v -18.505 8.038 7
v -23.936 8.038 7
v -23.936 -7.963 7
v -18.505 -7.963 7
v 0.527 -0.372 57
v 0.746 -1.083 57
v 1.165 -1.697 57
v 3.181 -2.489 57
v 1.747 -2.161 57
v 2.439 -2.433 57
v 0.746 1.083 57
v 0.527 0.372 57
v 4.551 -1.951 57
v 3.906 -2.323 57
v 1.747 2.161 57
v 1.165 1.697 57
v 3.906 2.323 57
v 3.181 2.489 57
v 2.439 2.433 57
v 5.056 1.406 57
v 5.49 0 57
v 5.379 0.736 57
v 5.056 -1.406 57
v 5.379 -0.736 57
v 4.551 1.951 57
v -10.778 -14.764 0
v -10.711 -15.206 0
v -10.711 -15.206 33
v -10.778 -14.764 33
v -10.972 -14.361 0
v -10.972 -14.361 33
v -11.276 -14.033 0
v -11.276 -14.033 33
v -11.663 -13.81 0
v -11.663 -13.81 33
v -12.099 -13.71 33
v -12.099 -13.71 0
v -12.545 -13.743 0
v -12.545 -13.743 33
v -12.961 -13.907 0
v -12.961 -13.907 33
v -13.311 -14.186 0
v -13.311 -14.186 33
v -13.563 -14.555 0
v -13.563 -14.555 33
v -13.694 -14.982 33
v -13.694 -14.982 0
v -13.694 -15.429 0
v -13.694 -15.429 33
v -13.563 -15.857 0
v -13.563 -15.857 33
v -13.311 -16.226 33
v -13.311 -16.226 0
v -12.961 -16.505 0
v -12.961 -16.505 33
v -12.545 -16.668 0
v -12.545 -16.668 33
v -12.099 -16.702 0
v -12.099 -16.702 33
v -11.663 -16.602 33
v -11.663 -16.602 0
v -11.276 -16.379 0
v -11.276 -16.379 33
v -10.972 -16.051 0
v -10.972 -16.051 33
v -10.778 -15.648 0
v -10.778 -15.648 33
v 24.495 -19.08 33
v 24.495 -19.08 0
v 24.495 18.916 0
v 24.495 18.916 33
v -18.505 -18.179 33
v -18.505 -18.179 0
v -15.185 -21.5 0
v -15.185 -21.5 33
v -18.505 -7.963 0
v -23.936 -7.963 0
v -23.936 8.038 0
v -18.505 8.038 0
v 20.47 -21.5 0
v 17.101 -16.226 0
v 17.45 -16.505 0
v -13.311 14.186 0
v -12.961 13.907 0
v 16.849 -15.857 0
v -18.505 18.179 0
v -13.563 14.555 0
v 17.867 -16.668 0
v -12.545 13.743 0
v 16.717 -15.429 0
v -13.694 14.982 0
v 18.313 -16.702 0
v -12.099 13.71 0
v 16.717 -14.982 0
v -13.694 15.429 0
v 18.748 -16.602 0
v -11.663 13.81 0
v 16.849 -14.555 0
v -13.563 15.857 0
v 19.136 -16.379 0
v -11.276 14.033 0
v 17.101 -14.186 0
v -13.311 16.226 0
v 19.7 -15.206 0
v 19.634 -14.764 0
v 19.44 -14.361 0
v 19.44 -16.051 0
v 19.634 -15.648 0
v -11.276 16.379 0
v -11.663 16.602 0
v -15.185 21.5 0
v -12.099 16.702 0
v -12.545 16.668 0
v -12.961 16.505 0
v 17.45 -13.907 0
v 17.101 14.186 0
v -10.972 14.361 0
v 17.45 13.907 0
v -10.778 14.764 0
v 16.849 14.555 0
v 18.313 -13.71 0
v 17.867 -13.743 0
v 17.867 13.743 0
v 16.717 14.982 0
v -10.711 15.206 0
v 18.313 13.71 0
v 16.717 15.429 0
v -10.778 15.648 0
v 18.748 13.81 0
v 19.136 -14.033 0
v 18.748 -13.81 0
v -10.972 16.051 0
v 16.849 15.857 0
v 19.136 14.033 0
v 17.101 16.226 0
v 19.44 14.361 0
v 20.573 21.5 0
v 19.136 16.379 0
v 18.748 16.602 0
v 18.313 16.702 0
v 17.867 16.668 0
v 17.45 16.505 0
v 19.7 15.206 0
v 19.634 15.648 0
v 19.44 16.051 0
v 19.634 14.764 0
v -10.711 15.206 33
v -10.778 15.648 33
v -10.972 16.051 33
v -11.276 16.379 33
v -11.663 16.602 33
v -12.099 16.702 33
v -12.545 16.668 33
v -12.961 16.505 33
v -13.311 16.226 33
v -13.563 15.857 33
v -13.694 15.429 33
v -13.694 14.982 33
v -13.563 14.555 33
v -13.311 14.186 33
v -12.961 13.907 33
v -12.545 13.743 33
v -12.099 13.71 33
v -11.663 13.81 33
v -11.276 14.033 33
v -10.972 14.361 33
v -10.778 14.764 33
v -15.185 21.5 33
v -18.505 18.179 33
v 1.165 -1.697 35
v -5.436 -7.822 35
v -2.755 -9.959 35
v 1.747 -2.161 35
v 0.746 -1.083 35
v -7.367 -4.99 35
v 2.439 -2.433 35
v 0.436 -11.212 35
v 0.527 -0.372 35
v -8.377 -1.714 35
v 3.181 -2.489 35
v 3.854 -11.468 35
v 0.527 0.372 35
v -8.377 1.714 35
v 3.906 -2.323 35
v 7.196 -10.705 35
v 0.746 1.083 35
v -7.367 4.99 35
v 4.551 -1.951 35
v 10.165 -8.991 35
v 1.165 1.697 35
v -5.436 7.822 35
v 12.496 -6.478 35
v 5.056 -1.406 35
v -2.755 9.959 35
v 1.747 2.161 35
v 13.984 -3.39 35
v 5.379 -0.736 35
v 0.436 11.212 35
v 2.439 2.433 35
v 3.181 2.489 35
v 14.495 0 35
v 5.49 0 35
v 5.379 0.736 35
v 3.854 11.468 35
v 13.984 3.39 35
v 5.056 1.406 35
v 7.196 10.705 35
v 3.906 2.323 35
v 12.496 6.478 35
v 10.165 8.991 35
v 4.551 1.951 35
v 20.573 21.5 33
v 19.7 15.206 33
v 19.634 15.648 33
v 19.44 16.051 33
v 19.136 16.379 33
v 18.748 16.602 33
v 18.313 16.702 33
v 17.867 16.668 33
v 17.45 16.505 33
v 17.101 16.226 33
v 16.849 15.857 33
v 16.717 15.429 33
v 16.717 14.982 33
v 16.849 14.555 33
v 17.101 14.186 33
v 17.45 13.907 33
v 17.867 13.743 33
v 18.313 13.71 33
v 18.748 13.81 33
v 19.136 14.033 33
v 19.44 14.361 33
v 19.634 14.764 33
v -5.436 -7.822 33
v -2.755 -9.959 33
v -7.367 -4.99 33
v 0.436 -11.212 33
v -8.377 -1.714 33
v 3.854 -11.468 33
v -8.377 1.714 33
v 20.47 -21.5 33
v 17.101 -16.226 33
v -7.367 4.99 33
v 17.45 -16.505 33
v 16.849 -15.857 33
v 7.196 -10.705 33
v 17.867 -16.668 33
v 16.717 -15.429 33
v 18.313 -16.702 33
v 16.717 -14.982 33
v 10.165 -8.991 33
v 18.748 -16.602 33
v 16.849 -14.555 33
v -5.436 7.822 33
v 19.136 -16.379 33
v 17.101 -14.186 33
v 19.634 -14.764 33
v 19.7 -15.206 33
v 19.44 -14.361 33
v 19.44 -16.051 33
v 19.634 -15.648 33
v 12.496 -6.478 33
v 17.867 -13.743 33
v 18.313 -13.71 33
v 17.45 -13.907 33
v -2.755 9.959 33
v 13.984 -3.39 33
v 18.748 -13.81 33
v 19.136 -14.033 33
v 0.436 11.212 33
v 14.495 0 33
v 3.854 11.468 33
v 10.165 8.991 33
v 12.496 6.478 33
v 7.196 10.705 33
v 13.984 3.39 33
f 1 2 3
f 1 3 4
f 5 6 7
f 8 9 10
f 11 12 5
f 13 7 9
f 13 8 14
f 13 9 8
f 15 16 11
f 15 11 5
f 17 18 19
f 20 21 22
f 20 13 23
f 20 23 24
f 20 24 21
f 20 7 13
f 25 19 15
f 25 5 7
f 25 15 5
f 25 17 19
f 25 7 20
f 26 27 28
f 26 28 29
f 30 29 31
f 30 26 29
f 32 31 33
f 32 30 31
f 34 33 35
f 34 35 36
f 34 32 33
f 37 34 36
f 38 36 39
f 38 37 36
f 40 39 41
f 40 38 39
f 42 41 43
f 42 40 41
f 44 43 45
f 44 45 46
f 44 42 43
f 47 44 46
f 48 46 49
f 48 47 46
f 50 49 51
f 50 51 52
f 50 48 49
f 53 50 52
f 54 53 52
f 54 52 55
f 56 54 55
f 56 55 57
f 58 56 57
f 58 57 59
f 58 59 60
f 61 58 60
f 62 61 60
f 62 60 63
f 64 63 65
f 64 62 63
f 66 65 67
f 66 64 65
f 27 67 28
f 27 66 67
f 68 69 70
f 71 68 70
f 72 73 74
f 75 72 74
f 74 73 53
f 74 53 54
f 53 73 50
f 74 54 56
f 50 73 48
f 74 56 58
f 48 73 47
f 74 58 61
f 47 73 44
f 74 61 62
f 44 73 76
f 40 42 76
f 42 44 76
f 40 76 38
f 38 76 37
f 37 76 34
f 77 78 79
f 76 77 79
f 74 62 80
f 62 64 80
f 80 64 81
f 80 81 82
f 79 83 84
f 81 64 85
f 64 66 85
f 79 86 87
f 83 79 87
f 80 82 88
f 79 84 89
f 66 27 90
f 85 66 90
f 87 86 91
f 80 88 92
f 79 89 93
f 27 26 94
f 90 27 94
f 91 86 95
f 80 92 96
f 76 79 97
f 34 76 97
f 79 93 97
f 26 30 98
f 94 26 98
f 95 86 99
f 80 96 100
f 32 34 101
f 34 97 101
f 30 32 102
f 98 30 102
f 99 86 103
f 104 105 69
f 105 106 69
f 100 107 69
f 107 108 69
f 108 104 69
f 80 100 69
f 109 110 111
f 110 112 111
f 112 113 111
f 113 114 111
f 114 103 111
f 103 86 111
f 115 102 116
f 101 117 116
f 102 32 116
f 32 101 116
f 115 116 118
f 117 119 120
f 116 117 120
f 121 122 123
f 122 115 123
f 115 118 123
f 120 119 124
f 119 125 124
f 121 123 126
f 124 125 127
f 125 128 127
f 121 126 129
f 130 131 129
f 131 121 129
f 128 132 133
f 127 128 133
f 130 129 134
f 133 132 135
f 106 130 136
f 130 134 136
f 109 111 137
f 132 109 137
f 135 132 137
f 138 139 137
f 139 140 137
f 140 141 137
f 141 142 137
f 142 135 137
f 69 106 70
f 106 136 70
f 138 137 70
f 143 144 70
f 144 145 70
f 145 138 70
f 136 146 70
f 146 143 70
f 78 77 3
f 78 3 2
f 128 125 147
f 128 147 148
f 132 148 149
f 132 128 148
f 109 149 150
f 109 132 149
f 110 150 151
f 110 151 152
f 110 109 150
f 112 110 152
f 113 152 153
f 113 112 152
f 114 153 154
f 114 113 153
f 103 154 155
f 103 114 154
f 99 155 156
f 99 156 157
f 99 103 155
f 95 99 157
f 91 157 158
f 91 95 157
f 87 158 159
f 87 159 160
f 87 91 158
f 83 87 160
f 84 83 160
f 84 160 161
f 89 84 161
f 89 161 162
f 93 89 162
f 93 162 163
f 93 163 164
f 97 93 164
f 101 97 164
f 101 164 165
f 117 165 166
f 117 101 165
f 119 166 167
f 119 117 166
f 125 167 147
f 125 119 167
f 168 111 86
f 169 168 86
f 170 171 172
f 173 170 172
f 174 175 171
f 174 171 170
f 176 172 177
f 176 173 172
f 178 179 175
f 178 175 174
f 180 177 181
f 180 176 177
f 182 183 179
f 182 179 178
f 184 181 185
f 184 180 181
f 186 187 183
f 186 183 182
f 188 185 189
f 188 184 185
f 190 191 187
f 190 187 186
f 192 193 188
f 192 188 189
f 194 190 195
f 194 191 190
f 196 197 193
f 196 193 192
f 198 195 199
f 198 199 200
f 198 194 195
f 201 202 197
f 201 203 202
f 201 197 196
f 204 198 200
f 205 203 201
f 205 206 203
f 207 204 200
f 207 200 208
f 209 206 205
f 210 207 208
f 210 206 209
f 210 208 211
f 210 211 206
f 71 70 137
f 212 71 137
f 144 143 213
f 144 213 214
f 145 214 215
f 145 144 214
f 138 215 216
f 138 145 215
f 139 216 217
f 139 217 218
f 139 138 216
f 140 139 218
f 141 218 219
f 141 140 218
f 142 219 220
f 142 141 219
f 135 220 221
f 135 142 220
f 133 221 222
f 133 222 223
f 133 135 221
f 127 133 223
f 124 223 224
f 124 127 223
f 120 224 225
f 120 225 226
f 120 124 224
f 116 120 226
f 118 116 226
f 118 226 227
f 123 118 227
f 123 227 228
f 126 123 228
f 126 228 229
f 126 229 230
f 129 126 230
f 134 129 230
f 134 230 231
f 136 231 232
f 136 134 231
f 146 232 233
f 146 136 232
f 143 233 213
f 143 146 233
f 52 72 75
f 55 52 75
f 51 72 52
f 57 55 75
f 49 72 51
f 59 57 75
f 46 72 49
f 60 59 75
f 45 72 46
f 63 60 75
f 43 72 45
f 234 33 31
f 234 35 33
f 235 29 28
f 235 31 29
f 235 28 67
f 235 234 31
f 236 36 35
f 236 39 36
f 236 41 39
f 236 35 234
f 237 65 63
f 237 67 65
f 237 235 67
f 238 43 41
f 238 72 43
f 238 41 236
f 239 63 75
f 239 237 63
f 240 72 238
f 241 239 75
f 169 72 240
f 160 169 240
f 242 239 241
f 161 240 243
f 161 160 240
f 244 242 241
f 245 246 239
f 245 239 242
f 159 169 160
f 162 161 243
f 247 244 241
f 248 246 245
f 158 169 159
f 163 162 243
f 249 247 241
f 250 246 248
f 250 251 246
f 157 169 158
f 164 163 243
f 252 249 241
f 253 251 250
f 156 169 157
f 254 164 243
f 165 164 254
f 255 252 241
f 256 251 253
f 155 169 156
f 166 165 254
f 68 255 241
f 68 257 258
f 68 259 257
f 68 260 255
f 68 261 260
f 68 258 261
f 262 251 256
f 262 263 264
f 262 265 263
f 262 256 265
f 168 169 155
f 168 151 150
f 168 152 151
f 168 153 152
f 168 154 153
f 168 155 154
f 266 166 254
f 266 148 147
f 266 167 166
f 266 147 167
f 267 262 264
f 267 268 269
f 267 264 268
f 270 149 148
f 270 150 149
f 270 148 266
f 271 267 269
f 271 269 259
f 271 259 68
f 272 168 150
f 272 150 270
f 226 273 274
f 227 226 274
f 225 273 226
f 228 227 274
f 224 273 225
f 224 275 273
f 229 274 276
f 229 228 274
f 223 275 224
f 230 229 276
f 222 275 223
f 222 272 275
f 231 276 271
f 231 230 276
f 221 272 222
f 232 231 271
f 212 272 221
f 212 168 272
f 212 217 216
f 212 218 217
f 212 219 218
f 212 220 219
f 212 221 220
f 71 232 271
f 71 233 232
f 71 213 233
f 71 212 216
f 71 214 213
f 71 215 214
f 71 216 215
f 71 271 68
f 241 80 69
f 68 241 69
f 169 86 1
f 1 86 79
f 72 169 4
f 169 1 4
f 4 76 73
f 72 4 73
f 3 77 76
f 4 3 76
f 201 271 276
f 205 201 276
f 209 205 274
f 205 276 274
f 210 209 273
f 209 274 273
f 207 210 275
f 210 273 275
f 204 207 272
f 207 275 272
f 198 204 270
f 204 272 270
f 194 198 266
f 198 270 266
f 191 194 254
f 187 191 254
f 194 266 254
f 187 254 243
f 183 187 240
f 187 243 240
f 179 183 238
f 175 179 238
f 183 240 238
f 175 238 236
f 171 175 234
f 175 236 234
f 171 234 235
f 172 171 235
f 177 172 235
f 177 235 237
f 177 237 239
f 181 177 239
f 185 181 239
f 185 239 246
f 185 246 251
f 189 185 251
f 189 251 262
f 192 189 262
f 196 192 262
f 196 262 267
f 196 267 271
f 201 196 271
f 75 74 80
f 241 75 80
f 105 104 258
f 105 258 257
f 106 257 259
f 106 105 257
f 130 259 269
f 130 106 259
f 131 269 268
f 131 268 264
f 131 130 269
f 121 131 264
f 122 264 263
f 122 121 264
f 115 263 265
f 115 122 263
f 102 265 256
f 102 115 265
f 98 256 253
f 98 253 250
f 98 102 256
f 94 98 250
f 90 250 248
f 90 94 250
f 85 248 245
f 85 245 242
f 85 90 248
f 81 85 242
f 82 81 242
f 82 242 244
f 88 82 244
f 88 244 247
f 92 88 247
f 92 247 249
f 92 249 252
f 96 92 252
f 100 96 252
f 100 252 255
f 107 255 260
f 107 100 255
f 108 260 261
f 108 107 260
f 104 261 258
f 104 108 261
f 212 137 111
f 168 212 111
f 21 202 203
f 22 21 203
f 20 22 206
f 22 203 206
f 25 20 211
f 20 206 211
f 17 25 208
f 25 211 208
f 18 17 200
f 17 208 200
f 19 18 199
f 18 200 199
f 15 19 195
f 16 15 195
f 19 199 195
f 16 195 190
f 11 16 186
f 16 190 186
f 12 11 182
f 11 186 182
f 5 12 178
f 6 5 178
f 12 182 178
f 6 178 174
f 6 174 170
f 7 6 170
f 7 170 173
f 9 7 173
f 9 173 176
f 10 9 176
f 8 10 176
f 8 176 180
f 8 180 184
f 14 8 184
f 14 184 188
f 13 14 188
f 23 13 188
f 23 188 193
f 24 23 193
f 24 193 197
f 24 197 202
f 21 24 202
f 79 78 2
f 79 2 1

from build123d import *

# Parameters (mm, degrees)
SKETCH1_R           = 1.5
BOSS_EXTRUDE1_DEPTH = 33
SKETCH1_3_R         = 11.5
BOSS_EXTRUDE2_DEPTH = 35
SKETCH1_4_R         = 2.495506105
BOSS_EXTRUDE3_DEPTH = 57
SKETCH1_5_W         = 5.430918786
SKETCH1_5_H         = 16.000755457
BOSS_EXTRUDE4_DEPTH = 7


with BuildPart() as part:
    # Sketch1 → Boss-Extrude1 (new body)
    with BuildSketch(Plane.XY):
        Polygon((-15.184651762, 21.5), (-18.505405032, 18.179246731), (-18.505405032, -18.179246731), (-15.184651762, -21.5), (20.470167461, -21.5), (24.494594968, -19.079506704), (24.494594968, 18.915642106), (20.57338357, 21.5), align=None)
        with Locations((-12.211230799, -15.205825767)):
            Circle(SKETCH1_R, mode=Mode.SUBTRACT)
        with Locations((18.200420735, -15.205825767)):
            Circle(SKETCH1_R, mode=Mode.SUBTRACT)
        with Locations((-12.211230799, 15.205825767)):
            Circle(SKETCH1_R, mode=Mode.SUBTRACT)
        with Locations((18.200420735, 15.205825767)):
            Circle(SKETCH1_R, mode=Mode.SUBTRACT)
    extrude(amount=BOSS_EXTRUDE1_DEPTH)

    # Sketch1<3> → Boss-Extrude2 (add)
    with BuildSketch(Plane.XY):
        with Locations((2.994594968, 0)):
            Circle(SKETCH1_3_R)
    extrude(amount=BOSS_EXTRUDE2_DEPTH)

    # Sketch1<4> → Boss-Extrude3 (add)
    with BuildSketch(Plane.XY):
        with Locations((2.994594968, 0)):
            Circle(SKETCH1_4_R)
    extrude(amount=BOSS_EXTRUDE3_DEPTH)

    # Sketch1<5> → Boss-Extrude4 (add)
    with BuildSketch(Plane.XY):
        with Locations((-21.220864425, 0.037249424)):
            Rectangle(SKETCH1_5_W, SKETCH1_5_H)
    extrude(amount=BOSS_EXTRUDE4_DEPTH)


solid = part.part
